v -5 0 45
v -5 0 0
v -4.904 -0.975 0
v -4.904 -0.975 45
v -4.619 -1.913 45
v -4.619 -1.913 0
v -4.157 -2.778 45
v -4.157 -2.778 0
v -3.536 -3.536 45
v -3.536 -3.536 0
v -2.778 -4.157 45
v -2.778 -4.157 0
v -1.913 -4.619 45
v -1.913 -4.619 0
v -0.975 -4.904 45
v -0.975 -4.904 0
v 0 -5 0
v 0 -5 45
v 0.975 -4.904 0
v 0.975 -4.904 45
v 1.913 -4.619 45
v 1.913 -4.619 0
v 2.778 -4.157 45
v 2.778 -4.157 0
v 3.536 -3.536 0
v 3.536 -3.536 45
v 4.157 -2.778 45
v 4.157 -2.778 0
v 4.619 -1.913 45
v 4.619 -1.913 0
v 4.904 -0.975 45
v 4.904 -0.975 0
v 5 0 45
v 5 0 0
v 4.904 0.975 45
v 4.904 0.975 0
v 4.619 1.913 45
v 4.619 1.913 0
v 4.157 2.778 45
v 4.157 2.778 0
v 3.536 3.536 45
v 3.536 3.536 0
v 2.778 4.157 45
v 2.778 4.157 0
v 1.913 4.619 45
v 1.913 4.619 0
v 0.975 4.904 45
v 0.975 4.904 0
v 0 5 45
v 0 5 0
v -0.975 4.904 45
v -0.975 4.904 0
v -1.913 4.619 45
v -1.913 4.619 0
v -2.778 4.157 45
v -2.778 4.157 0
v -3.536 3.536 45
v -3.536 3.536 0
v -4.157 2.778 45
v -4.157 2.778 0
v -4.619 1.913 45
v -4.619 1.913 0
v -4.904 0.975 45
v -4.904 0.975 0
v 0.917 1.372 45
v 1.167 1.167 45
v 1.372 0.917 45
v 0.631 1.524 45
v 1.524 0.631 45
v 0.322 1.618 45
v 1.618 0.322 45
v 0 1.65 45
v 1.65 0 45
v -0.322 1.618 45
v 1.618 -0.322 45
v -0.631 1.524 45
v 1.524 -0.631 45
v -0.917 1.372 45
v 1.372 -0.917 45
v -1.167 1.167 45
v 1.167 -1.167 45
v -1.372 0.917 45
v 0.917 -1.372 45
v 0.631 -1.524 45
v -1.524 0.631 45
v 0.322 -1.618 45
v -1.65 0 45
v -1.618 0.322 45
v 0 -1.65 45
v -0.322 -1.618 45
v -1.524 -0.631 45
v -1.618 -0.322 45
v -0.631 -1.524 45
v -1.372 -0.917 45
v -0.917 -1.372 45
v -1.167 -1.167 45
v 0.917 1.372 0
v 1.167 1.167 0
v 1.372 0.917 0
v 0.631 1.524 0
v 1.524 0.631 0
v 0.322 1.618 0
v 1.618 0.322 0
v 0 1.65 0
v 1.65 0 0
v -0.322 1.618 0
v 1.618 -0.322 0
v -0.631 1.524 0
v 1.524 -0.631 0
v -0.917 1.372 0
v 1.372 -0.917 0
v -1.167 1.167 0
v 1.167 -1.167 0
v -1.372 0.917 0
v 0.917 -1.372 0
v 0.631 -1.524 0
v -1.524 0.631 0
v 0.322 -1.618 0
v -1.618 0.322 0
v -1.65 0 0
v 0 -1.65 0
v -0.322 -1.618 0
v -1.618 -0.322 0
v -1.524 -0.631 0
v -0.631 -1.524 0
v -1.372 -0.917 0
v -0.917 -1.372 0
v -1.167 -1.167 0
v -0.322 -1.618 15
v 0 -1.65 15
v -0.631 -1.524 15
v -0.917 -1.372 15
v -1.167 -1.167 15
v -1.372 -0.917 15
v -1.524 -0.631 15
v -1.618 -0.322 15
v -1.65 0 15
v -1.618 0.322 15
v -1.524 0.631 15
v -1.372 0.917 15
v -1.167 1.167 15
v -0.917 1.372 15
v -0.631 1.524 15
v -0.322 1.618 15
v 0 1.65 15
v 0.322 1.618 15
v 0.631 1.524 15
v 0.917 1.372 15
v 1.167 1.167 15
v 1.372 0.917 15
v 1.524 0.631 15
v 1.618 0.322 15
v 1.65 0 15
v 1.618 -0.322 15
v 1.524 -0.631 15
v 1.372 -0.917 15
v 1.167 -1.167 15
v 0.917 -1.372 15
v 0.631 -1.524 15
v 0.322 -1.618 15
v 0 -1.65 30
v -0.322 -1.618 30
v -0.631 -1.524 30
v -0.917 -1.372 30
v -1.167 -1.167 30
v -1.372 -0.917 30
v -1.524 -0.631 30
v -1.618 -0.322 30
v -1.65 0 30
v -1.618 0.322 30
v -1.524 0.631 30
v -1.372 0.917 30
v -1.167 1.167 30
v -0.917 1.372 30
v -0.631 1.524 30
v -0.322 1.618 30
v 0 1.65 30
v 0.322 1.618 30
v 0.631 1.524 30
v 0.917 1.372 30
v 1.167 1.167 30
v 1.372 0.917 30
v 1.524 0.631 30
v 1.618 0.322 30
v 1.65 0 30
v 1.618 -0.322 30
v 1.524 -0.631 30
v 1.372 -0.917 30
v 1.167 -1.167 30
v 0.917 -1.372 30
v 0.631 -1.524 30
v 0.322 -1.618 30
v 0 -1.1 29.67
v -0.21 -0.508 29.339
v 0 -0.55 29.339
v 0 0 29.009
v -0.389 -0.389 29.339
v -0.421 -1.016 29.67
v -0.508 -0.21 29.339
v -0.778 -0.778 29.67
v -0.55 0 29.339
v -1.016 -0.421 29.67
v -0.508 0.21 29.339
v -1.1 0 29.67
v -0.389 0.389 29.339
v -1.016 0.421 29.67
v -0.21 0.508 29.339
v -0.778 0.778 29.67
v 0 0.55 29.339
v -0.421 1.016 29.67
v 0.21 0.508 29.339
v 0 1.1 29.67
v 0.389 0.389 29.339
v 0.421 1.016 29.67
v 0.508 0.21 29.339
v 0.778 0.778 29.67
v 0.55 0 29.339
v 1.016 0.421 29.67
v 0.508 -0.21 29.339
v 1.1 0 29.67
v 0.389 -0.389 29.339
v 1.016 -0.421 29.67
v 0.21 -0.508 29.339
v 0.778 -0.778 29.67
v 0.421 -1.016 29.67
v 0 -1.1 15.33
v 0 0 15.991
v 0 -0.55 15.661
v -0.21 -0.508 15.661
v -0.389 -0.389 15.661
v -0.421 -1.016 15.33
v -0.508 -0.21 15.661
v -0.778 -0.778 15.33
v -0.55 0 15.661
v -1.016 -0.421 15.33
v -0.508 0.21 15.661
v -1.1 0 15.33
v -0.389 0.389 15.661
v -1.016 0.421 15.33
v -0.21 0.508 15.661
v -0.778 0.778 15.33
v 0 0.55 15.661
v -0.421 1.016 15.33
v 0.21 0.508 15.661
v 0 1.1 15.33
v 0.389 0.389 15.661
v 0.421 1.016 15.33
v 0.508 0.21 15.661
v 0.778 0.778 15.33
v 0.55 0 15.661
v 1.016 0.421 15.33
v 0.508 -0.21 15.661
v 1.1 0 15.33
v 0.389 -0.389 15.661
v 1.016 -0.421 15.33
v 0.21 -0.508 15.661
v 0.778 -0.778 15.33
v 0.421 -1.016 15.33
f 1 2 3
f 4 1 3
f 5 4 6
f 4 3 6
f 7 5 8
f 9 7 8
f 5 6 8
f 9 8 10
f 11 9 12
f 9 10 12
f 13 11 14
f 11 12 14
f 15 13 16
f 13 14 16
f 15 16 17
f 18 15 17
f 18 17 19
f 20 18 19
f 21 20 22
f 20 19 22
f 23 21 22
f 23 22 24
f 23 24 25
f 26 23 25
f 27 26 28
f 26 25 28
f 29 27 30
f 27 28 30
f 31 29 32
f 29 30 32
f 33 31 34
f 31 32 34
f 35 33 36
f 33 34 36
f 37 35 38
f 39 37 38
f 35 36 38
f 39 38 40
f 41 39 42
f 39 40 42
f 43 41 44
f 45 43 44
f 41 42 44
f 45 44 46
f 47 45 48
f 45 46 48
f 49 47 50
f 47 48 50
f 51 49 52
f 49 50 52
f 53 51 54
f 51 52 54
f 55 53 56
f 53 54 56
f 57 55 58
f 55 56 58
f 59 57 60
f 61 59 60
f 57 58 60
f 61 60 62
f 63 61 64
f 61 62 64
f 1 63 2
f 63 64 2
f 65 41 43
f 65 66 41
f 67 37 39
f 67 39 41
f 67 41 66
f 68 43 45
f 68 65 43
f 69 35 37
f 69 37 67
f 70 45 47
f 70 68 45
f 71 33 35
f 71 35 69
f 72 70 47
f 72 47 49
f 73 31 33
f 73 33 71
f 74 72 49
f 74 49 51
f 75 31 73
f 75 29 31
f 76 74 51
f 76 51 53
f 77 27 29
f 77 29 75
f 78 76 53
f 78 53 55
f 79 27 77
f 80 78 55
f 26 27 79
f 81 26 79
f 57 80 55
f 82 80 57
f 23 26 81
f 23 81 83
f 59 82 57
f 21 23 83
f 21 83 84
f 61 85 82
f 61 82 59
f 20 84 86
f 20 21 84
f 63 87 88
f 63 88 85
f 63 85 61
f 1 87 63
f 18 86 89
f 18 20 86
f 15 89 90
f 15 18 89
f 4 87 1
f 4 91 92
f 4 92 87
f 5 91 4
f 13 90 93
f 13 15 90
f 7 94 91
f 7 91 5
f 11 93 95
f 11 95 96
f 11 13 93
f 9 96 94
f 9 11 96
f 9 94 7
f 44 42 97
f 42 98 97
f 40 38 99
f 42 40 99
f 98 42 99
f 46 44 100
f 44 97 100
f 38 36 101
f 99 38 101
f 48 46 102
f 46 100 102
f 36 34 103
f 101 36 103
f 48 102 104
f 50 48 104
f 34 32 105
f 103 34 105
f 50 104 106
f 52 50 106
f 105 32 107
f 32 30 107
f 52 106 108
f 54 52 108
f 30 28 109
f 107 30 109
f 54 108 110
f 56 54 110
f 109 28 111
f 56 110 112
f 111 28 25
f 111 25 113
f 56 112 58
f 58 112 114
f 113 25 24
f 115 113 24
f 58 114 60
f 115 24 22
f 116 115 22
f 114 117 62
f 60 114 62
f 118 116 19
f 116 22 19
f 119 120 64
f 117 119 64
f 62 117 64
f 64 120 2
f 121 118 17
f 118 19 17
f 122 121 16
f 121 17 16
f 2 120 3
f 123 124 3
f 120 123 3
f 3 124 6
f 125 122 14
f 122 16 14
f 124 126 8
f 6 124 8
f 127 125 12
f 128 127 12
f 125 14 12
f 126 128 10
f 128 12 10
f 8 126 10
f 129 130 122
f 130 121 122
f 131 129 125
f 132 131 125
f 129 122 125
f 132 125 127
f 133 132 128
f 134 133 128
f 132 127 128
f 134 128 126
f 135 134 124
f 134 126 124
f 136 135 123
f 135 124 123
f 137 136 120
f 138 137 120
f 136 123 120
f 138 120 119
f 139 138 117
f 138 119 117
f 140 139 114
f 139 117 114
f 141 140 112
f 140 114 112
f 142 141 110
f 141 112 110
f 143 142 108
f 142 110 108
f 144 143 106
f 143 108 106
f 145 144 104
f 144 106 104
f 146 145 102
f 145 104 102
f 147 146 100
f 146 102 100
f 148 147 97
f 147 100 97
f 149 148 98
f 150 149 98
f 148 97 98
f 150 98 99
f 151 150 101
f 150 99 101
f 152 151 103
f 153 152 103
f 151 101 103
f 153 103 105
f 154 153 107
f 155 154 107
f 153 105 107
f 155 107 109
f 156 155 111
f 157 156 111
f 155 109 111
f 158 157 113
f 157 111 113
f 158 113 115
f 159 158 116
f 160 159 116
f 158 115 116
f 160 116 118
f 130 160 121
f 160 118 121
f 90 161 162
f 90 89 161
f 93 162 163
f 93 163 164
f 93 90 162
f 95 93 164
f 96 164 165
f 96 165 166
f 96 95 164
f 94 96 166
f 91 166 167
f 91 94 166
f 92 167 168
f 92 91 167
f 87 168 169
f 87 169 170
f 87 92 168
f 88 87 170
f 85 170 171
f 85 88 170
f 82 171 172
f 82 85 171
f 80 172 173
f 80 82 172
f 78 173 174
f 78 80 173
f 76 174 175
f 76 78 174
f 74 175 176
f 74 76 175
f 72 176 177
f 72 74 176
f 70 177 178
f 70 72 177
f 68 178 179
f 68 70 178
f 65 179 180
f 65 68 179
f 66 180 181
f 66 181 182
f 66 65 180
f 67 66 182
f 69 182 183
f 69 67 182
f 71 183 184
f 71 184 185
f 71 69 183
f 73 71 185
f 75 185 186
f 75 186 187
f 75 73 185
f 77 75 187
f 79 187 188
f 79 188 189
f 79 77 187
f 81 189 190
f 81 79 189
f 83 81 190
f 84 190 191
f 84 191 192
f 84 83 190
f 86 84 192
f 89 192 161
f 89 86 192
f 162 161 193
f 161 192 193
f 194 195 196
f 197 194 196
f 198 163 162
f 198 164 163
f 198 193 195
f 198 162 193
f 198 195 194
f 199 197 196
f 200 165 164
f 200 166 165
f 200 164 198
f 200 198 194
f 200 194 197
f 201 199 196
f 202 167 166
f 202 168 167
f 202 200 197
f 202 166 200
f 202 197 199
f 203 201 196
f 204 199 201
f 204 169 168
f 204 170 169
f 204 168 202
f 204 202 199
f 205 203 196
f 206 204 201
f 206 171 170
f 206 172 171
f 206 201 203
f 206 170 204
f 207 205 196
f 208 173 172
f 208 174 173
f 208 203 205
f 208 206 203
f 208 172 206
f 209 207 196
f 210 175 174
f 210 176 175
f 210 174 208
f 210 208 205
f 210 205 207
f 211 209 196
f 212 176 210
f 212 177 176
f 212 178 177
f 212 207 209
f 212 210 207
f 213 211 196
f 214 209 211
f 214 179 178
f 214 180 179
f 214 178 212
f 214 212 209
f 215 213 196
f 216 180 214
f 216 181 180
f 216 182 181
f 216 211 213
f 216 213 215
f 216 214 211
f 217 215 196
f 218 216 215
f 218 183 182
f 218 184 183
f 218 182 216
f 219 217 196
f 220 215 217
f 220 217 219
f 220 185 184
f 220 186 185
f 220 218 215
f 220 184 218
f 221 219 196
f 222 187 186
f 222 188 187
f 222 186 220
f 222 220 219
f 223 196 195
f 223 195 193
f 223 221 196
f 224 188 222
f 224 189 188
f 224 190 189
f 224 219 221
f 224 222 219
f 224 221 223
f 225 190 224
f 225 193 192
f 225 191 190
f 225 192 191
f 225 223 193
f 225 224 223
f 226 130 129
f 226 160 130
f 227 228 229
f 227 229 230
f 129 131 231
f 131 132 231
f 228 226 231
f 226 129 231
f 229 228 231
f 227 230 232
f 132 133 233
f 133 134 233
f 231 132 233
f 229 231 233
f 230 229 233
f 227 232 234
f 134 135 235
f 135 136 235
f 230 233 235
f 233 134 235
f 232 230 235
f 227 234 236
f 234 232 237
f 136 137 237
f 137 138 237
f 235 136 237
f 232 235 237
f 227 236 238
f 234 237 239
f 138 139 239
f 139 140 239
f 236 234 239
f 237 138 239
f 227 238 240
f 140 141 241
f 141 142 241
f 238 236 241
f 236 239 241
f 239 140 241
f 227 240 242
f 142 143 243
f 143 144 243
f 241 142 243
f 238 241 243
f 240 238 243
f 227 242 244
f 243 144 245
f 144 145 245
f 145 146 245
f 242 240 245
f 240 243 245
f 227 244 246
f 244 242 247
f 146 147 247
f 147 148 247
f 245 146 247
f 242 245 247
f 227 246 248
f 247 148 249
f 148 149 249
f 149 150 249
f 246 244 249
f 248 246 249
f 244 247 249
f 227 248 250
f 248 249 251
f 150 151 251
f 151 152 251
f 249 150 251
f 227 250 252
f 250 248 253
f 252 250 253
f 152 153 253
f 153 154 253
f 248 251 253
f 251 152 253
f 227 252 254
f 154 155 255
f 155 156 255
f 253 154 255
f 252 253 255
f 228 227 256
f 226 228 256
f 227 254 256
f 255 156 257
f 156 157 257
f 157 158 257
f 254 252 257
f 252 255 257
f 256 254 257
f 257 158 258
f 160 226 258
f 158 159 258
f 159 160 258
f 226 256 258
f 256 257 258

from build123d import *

# Parameters (mm, degrees)
SKETCH_1_R      = 5
EXTRUDE_1_DEPTH = 45


with BuildPart() as part:
    # ｽｹｯﾁ1 → ﾎﾞｽ - 押し出し1 (new body)
    with BuildSketch(Plane.XY):
        with Locations(Location((0, 0, 0), (0, 0, 180))):
            Circle(SKETCH_1_R)
    extrude(amount=EXTRUDE_1_DEPTH)

    # ｽｹｯﾁ3 → M4x0.7 ねじ穴1 (revolve, cut)
    with BuildSketch(Plane(origin=(0, 0, 45), x_dir=(0, -1, 0), z_dir=(1, 0, 0))):
        Polygon((0, 0), (0, 15.991420021), (1.65, 15), (1.65, 0), align=None)
    m4x0_7_1 = revolve(axis=Axis((0, 0, 51.35), (0, 0, -1)), mode=Mode.SUBTRACT)

    # ﾐﾗｰ1: M4x0.7 ねじ穴1 across plane
    add(m4x0_7_1.mirror(Plane.XY.offset(22.5)), mode=Mode.SUBTRACT)


solid = part.part
